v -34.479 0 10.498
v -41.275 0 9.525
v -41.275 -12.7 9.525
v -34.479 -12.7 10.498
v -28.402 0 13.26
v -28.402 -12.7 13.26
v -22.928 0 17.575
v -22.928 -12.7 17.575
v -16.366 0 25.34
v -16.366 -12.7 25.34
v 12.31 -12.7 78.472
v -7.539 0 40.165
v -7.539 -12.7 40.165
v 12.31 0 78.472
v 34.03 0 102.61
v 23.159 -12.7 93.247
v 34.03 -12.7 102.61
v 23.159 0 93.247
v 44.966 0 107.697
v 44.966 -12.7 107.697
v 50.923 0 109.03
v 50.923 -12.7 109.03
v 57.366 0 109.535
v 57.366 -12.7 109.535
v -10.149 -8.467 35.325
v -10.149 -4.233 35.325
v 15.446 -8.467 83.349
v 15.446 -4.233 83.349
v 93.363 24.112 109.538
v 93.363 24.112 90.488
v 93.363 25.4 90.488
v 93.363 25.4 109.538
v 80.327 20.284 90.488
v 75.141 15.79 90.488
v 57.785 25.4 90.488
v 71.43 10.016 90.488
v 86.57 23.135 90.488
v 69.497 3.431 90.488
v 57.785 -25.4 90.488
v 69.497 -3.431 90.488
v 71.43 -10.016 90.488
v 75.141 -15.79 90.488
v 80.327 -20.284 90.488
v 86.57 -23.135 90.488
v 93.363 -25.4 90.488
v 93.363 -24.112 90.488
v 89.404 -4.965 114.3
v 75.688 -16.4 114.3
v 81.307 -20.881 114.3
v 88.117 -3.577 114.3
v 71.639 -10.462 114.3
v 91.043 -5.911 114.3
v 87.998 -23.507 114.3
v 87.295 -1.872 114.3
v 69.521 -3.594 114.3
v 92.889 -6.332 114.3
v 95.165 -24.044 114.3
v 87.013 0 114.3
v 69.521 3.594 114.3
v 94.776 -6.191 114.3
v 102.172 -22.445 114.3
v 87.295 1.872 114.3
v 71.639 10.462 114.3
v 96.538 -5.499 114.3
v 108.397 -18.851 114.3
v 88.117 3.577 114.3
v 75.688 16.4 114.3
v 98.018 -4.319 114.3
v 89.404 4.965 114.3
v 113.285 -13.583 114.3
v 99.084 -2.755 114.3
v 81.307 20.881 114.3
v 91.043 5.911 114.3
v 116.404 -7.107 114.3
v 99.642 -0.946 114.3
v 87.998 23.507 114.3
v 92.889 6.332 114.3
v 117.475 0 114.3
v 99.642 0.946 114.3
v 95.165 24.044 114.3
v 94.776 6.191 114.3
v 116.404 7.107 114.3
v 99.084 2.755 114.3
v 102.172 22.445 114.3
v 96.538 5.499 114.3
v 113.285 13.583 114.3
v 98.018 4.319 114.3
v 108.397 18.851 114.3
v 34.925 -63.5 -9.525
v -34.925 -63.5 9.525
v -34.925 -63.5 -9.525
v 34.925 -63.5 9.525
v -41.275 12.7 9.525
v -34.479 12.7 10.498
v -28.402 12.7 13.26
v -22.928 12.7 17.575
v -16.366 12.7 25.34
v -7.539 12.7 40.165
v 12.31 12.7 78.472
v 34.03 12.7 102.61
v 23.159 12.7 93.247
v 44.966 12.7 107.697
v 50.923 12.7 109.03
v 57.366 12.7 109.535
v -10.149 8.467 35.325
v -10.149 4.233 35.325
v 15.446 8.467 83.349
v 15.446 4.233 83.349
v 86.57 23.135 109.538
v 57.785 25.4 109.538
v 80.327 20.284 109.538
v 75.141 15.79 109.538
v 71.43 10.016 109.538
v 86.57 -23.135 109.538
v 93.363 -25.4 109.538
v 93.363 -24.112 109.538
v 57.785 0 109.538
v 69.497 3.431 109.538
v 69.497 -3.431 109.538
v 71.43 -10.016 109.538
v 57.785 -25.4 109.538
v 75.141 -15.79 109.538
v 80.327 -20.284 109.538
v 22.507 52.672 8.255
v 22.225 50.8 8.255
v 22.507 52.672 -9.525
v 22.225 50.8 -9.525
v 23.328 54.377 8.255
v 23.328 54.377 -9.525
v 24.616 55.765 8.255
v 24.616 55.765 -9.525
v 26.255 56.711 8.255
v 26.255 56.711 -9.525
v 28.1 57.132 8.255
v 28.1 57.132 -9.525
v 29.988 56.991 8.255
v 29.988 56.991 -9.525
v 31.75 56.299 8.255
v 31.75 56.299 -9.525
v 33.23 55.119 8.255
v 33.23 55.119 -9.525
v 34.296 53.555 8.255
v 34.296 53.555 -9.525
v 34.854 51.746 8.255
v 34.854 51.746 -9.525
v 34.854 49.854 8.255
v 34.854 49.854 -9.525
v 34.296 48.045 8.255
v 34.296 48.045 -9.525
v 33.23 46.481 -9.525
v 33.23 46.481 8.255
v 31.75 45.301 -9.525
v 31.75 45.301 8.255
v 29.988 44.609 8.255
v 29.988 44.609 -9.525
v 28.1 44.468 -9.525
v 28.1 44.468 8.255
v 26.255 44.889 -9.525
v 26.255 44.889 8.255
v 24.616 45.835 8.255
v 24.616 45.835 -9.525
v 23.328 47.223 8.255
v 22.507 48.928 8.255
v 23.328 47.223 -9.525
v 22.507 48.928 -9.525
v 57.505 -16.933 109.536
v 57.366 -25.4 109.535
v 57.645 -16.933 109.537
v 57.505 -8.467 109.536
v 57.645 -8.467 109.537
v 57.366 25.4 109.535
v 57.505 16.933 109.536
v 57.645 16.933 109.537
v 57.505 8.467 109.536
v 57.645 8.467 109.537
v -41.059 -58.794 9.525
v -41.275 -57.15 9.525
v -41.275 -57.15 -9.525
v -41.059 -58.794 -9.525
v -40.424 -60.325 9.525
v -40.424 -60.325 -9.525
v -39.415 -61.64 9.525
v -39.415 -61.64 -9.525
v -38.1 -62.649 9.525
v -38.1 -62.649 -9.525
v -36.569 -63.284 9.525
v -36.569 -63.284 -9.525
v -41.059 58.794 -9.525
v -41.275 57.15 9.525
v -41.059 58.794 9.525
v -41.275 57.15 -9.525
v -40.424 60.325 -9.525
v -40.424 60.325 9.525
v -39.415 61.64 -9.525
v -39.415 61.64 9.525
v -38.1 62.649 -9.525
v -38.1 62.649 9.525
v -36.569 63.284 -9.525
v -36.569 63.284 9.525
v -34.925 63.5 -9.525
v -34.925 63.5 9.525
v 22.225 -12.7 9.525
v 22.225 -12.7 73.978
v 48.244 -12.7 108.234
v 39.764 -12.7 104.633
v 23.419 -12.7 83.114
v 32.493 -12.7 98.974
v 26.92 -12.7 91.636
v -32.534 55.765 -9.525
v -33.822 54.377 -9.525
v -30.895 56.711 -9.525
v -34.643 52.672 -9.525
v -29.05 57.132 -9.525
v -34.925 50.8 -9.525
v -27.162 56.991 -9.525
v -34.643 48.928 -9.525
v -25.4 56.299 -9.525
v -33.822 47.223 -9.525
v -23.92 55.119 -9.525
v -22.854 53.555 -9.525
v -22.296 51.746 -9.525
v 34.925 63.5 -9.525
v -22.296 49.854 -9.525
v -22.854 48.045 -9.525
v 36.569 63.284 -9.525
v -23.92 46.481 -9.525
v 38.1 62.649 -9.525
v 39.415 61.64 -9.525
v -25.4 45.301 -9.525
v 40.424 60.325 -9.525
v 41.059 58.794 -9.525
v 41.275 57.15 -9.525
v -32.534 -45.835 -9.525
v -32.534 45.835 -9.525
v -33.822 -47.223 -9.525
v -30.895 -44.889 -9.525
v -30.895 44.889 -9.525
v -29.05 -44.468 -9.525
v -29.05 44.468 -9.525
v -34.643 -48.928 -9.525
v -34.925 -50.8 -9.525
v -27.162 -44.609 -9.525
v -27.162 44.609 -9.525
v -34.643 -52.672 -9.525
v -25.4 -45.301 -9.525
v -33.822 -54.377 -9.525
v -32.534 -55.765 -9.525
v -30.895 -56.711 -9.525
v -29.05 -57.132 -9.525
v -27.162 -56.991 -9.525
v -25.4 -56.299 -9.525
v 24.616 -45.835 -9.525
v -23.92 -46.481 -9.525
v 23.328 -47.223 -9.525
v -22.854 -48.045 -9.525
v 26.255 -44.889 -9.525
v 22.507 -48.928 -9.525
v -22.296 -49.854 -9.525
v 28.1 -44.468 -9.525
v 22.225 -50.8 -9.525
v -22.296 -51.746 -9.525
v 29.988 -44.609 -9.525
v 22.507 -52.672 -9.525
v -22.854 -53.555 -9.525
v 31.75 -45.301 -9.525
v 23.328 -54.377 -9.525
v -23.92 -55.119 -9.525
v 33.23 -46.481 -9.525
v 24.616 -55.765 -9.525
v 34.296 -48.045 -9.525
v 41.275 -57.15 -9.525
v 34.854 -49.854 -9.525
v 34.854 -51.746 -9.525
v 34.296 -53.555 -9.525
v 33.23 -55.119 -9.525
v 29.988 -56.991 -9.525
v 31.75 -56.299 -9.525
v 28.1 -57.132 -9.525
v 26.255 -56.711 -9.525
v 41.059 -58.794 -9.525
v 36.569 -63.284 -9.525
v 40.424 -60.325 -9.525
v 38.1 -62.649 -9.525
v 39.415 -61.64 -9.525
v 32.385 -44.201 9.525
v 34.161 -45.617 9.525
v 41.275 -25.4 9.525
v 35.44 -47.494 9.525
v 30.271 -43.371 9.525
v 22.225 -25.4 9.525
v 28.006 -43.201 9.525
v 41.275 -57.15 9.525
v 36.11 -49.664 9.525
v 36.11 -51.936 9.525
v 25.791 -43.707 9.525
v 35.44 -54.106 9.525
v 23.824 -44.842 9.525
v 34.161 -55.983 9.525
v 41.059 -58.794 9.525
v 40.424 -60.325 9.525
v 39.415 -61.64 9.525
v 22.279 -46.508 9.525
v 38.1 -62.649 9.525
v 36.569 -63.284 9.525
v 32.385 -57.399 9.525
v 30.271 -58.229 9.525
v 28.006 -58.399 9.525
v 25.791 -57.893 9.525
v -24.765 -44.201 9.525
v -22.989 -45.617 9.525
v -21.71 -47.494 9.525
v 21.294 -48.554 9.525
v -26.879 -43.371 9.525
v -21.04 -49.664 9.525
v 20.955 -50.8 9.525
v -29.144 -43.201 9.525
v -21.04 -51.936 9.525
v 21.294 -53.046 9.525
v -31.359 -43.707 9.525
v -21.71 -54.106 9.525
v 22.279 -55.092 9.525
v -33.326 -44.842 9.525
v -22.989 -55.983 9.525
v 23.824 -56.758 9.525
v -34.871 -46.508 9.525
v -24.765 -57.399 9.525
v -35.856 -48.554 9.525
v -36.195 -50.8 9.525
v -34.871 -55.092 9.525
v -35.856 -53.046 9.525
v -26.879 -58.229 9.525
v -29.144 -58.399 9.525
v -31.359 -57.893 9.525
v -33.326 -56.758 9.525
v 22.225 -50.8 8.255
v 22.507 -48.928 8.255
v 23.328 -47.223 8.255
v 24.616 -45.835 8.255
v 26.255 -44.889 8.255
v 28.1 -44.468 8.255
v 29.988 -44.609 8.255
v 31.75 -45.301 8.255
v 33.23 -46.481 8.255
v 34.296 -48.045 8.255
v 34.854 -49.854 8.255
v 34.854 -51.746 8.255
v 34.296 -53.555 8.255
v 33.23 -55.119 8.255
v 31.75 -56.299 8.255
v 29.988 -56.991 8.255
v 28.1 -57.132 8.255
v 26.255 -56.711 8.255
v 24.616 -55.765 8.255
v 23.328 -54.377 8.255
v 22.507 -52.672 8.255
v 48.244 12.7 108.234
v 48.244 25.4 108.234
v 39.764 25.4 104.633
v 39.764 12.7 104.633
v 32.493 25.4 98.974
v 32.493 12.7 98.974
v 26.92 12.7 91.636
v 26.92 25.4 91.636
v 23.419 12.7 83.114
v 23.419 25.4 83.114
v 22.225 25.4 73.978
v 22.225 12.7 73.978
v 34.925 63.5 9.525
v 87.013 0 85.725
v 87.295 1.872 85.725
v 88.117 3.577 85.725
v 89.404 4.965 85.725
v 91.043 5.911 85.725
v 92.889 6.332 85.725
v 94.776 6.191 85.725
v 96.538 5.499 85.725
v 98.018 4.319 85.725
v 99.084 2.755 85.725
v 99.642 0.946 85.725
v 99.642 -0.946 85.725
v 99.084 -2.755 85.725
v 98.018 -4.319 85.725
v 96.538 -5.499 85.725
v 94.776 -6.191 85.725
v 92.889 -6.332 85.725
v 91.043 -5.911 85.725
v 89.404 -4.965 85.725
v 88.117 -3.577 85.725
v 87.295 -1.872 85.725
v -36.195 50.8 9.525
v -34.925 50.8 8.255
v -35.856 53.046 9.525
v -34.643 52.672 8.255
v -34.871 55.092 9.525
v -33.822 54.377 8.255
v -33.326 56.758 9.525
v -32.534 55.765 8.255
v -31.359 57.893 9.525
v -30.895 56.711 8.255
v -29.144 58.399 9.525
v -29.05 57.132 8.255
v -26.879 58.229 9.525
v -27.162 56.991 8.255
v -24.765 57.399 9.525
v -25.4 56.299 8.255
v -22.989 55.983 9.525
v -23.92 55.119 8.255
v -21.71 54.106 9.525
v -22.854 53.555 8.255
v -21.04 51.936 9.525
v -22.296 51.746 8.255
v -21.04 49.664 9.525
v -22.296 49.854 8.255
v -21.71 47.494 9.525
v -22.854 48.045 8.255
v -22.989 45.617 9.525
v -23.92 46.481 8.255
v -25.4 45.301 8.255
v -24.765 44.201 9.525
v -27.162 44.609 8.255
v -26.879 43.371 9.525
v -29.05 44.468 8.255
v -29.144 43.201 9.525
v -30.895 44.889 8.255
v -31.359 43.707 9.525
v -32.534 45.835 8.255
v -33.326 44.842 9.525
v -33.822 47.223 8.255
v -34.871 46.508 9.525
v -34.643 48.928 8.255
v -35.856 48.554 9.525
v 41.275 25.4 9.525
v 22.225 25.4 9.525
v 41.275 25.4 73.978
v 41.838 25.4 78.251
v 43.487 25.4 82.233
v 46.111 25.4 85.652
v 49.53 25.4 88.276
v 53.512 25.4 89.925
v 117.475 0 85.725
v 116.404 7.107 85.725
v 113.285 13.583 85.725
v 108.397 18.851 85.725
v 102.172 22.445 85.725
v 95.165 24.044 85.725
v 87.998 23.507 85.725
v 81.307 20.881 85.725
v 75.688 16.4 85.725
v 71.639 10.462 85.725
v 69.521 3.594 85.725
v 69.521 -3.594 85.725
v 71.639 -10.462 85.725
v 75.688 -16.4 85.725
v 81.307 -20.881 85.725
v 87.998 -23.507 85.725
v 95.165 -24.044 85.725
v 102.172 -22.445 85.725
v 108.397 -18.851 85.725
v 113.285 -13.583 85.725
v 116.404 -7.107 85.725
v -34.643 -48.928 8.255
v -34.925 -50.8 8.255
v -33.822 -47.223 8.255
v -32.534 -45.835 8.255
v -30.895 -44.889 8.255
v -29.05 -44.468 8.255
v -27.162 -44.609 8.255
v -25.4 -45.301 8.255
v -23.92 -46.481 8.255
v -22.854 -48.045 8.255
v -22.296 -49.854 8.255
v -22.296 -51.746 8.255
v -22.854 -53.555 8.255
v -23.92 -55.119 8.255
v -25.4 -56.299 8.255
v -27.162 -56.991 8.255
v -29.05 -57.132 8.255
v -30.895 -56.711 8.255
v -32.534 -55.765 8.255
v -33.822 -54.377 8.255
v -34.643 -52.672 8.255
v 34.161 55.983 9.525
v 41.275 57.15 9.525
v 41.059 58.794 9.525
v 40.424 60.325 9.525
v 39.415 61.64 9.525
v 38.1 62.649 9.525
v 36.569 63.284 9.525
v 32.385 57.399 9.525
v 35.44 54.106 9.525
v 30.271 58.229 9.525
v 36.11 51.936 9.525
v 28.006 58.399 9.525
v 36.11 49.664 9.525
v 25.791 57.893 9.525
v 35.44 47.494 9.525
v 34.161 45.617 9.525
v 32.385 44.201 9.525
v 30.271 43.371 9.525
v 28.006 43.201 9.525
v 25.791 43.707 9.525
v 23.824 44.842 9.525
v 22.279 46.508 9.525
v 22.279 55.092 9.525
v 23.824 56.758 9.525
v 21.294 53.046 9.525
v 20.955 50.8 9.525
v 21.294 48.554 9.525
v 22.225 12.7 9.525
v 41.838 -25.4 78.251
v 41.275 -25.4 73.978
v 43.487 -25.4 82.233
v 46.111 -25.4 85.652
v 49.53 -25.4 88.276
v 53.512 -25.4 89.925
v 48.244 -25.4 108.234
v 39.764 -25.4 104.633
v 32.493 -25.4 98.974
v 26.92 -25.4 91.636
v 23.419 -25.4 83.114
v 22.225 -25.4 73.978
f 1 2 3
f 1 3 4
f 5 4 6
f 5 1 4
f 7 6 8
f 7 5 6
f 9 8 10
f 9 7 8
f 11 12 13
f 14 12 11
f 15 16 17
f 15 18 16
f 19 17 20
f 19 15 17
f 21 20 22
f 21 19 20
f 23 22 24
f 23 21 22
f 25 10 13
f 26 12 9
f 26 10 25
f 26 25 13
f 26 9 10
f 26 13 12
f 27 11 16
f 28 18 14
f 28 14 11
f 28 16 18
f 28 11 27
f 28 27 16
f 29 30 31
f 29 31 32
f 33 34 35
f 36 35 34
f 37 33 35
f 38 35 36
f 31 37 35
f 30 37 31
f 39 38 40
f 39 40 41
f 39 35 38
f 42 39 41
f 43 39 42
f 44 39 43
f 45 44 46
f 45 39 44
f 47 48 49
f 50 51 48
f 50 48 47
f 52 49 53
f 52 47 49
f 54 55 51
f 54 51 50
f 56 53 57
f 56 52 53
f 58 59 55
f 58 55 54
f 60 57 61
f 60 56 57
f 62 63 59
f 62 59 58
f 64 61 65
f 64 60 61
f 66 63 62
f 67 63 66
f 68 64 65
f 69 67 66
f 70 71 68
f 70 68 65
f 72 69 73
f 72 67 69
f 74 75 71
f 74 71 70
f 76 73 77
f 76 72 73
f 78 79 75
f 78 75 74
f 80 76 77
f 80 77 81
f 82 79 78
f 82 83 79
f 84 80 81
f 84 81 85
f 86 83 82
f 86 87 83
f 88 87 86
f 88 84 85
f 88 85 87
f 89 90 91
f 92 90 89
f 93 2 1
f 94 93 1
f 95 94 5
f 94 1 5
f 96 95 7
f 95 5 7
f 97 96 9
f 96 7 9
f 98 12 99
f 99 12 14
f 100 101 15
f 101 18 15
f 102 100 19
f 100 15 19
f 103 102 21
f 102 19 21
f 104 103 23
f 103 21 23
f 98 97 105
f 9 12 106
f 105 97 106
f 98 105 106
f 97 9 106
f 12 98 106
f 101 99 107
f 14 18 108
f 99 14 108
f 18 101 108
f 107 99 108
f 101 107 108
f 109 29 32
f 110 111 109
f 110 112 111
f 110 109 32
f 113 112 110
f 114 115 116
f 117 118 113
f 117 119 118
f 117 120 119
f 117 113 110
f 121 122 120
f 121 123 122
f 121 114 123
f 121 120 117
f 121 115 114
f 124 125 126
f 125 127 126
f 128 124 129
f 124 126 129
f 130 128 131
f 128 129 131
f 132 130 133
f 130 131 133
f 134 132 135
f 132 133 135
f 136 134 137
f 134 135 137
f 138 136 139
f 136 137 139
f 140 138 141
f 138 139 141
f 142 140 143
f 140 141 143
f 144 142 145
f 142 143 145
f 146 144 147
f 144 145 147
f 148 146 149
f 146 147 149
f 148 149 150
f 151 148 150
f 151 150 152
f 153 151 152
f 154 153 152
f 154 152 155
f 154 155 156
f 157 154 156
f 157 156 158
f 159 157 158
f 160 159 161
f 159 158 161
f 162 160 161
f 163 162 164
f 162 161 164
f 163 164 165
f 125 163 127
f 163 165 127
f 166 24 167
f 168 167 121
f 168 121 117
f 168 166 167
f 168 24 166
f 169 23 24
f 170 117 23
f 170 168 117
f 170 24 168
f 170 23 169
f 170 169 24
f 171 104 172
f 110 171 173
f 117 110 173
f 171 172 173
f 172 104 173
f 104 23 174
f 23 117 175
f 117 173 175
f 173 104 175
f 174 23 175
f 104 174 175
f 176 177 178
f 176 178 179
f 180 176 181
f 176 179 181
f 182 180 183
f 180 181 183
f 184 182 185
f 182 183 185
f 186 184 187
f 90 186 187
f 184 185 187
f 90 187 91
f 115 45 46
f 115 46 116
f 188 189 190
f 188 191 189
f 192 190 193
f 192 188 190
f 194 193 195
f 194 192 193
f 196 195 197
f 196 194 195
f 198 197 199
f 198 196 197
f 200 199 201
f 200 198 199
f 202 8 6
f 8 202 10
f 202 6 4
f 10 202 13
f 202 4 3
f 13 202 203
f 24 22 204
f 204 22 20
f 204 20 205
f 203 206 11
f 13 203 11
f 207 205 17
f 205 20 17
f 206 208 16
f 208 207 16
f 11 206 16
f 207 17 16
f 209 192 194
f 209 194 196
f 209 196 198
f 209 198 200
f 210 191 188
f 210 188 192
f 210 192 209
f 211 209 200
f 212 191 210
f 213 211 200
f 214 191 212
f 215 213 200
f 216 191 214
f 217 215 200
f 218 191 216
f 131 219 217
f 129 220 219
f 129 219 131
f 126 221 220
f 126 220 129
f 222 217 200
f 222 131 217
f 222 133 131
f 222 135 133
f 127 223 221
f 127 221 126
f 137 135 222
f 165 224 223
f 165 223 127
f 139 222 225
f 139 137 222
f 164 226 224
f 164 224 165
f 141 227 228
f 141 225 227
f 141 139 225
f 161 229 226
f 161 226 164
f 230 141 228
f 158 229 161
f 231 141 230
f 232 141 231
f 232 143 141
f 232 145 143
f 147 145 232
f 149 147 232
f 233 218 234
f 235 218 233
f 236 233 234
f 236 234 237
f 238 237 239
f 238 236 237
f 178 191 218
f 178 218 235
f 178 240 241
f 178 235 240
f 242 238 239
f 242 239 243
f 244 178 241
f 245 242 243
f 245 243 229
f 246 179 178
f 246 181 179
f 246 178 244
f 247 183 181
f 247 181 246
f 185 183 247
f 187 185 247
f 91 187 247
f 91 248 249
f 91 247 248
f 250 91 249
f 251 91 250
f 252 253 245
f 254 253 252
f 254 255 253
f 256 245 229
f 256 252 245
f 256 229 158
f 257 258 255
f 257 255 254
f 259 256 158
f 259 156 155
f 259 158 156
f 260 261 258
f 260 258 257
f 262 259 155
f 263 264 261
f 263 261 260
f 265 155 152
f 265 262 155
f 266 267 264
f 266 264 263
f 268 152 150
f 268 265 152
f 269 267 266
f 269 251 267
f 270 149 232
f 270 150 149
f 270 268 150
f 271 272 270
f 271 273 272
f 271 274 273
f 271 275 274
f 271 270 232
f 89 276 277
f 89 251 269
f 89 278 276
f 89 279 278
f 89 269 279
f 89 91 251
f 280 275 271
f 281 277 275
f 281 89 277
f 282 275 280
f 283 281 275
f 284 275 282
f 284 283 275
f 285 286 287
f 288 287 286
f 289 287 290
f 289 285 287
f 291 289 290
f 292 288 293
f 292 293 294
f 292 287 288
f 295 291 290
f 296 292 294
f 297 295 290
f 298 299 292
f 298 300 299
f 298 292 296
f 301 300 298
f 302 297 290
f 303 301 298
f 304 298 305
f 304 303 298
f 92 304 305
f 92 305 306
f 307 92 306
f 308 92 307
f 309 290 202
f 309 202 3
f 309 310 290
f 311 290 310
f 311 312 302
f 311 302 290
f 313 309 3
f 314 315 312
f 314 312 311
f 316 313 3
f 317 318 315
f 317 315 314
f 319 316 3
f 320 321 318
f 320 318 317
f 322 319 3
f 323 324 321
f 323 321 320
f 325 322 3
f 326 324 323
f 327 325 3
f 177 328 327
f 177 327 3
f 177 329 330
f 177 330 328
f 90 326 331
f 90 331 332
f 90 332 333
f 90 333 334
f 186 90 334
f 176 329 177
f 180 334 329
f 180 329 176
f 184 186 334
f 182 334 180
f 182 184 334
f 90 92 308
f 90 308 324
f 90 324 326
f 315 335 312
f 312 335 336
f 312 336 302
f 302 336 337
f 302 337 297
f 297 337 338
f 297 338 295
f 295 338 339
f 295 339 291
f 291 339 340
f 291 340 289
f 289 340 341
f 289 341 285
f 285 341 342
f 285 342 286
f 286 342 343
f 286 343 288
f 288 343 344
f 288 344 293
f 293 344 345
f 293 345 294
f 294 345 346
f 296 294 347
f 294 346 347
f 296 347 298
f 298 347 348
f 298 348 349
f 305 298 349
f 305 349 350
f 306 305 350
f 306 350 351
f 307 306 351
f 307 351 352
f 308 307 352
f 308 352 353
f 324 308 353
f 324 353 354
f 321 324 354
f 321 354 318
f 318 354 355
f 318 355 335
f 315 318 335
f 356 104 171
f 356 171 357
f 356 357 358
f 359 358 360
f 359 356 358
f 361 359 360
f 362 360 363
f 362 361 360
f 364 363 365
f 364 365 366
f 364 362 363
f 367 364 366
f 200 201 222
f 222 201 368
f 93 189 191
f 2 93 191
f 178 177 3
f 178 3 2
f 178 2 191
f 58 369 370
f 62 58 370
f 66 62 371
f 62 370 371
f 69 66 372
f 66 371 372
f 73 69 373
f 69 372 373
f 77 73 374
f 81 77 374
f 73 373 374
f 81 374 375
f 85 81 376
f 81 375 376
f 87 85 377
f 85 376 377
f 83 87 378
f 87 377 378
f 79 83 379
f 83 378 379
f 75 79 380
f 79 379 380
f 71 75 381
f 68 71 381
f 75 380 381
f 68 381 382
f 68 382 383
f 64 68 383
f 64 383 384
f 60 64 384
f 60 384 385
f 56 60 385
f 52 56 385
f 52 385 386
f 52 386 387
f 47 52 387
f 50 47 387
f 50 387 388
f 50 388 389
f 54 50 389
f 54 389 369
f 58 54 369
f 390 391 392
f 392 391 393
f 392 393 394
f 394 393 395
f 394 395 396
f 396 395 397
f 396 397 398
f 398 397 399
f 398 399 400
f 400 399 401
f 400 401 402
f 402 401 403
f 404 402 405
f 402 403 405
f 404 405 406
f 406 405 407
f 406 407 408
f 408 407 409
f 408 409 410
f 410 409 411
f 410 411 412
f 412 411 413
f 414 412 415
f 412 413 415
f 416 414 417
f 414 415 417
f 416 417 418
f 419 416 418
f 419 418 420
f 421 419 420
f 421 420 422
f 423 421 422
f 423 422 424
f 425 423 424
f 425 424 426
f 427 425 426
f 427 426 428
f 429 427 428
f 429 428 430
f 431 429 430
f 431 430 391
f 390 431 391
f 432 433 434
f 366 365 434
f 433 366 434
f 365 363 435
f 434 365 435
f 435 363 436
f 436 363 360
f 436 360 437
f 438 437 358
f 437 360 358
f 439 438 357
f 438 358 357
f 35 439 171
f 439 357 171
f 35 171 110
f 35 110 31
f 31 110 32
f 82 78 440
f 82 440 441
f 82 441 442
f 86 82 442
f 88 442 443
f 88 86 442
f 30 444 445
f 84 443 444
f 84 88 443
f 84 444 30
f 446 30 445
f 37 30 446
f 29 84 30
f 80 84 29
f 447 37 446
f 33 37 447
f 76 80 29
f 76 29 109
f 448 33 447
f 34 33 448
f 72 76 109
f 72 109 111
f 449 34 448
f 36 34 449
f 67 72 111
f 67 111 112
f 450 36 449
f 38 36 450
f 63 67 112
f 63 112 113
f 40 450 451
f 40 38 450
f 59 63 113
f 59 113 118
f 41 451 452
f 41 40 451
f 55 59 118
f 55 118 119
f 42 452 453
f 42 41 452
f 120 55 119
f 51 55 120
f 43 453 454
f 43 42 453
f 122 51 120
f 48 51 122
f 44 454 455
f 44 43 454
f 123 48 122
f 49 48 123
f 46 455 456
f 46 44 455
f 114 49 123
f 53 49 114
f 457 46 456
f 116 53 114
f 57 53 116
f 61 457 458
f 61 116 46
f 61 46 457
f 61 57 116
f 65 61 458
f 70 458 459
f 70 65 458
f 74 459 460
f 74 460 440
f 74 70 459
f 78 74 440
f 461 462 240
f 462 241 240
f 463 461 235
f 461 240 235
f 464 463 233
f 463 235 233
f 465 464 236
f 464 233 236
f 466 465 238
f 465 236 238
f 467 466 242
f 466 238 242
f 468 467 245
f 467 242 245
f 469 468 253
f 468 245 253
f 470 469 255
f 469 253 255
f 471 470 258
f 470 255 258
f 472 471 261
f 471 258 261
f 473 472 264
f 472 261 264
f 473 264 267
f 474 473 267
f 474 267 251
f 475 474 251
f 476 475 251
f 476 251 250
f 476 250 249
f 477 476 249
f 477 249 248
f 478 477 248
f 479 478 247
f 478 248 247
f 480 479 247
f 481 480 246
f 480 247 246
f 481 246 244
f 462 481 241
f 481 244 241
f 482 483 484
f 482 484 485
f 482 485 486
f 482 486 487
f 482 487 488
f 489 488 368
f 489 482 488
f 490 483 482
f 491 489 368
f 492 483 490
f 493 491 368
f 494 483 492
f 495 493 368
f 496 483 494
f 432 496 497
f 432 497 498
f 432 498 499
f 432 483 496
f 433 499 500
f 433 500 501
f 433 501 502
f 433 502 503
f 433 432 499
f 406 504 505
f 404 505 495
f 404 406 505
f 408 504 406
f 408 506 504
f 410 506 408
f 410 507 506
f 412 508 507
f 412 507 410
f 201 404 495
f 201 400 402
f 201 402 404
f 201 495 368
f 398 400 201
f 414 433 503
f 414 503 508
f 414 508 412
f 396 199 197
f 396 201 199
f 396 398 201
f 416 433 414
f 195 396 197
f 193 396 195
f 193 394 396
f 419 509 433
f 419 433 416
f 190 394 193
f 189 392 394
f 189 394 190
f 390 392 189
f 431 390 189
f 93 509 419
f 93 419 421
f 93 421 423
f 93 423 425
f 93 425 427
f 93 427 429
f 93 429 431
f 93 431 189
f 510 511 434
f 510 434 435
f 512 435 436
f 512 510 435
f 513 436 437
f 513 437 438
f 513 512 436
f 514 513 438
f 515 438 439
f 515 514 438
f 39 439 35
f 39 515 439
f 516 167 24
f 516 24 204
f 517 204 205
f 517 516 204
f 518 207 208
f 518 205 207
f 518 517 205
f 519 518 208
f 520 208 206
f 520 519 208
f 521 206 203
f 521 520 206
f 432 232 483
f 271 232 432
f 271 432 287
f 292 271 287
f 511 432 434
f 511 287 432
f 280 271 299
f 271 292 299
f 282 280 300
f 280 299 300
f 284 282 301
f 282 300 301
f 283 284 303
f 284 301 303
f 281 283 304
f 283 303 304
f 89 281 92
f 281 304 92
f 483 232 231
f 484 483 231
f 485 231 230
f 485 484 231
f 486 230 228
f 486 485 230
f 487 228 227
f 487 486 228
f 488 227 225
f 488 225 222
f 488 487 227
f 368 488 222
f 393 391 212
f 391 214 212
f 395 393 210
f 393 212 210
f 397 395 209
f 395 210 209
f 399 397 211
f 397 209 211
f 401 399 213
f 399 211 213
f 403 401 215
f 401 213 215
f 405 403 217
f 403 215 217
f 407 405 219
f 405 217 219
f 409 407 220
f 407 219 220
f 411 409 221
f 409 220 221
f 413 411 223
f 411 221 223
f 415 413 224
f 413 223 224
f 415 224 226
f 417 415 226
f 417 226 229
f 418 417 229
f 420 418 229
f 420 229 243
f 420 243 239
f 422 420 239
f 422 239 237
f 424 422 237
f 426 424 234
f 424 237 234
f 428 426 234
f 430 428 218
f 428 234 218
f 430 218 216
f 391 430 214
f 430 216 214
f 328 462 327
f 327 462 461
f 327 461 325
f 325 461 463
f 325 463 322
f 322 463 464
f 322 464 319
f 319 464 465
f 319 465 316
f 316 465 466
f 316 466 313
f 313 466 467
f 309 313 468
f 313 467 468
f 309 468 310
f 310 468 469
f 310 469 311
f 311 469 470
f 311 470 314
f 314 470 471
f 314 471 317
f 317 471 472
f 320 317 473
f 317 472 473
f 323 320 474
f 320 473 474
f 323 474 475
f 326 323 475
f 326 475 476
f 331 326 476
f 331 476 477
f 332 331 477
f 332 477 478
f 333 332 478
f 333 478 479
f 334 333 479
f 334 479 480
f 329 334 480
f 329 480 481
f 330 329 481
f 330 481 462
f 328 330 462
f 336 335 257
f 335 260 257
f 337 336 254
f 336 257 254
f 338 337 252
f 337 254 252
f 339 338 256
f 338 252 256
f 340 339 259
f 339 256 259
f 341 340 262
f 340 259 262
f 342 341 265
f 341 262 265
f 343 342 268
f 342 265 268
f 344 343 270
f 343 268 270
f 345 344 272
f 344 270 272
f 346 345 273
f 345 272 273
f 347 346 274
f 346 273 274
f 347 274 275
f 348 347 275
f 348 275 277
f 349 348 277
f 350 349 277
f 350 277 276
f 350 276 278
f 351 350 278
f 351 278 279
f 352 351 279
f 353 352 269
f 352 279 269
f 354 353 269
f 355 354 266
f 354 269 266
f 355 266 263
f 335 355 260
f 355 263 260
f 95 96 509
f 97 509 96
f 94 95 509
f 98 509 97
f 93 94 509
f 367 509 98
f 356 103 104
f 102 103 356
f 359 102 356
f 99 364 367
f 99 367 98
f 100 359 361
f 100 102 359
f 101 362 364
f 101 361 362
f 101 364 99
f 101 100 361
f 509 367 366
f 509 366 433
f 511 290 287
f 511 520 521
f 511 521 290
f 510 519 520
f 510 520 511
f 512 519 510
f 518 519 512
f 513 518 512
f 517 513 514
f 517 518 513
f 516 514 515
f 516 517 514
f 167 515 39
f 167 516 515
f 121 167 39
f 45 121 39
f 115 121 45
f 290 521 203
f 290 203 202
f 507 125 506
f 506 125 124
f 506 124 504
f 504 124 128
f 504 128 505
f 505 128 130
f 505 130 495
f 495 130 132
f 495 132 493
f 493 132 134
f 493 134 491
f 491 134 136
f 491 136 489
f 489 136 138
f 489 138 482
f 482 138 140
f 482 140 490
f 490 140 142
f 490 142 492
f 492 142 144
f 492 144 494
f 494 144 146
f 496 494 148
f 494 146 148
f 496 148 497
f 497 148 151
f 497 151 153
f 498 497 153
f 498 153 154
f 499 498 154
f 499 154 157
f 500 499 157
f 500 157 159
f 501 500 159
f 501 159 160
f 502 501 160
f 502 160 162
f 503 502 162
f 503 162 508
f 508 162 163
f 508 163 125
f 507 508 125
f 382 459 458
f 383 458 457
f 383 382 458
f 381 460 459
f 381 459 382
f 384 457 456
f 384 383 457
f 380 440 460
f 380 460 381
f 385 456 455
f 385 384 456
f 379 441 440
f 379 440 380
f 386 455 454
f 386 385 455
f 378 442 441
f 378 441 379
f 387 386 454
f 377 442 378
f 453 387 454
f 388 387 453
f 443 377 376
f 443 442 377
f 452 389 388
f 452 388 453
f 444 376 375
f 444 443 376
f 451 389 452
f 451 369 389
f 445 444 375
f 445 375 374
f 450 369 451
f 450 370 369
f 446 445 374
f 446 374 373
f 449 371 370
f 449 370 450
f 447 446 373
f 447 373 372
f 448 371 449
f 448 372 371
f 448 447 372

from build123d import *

# Parameters (mm, degrees)
F1_DEPTH       = 63.5
F0_W           = 26.6882655859
F0_H           = 19.05
F2_DEPTH       = 25.4
F3_DEPTH       = 12.7
F5_R           = 6.35
F7_D           = 12.7
F9_D           = 12.7
F9_CSINK_D     = 15.24
F9_CSINK_ANGLE = 90


with BuildPart() as f1:
    # F0 (on Front) → F1 (new body, symmetric)
    with BuildSketch(Plane.XZ):
        Polygon((-41.275, 9.525), (-41.275, -9.525), (41.275, -9.525), (41.275, 9.525), (22.225, 9.525), align=None)
    extrude(amount=F1_DEPTH, both=True)

    # F0 (on Front) → F2 (join, symmetric)
    with BuildSketch(Plane.XZ):
        with BuildLine():
            Line((22.225, 9.525), (41.275, 9.525))
            Line((41.275, 9.525), (41.275, 73.9775))
            ThreePointArc((41.275, 73.9775), (46.1106670426, 85.6518329574), (57.785, 90.4875))
            Line((57.785, 90.4875), (66.675, 90.4875))
            Line((66.675, 90.4875), (66.675, 109.5375))
            Line((66.675, 109.5375), (57.785, 109.5375))
            add(Edge.make_bspline(
                [(57.3658867379, 109.5350300615), (57.5052527002, 109.5364377458), (57.6449566509, 109.5372620063), (57.785, 109.5375)],
                knots=[140.4259734343, 140.4259734343, 140.4259734343, 140.4259734343, 140.7671259785, 140.7671259785, 140.7671259785, 140.7671259785], degree=3))
            ThreePointArc((57.3658867379, 109.5350300615), (32.4925380044, 98.9735990196), (22.225, 73.9775))
            Line((22.225, 73.9775), (22.225, 9.525))
        make_face()
        with Locations((80.019132793, 100.0125)):
            Rectangle(F0_W, F0_H)
    extrude(amount=F2_DEPTH, both=True)

    # F0 (on Front) → F3 (join, symmetric)
    with BuildSketch(Plane.XZ):
        with BuildLine():
            add(Edge.make_bspline(
                [(-41.275, 9.525), (-0.1000309637, 9.525), (-0.0002424275, 108.9555959023), (57.3658867379, 109.5350300615)],
                knots=[0, 0, 0, 0, 140.4259734343, 140.4259734343, 140.4259734343, 140.4259734343], degree=3))
            Line((-41.275, 9.525), (22.225, 9.525))
            Line((22.225, 9.525), (22.225, 73.9775))
            ThreePointArc((22.225, 73.9775), (32.4925380044, 98.9735990196), (57.3658867379, 109.5350300615))
        make_face()
    extrude(amount=F3_DEPTH, both=True)

    # F0 (on Front) → F4 (revolve)
    with BuildSketch(Plane.XZ):
        Polygon((93.3632655859, 114.3), (93.3632655859, 109.5375), (93.3632655859, 90.4875), (93.3632655859, 85.725), (117.475, 85.725), (117.475, 114.3), align=None)
    revolve(axis=Axis((93.3632655859, 0, 100.0125), (0, 0, 1)))

    # F5
    f5_edges = [f1.edges().sort_by_distance(p)[0] for p in [
        (-41.275, -63.5, 0),
        (41.275, -63.5, 0),
        (-41.275, 63.5, 0),
        (41.275, 63.5, 0),
    ]]
    fillet(f5_edges, radius=F5_R)

    # F7 (through all)
    with Locations(Plane.XY.offset(114.3)):
        with Locations((93.3632655859, 0)):
            Hole(F7_D / 2)

    # F9 (through all)
    with Locations(Plane.XY.offset(9.525)):
        with Locations((-28.575, -50.8), (28.575, -50.8), (28.575, 50.8), (-28.575, 50.8)):
            CounterSinkHole(F9_D / 2, F9_CSINK_D / 2, counter_sink_angle=F9_CSINK_ANGLE)


solid = f1.part
